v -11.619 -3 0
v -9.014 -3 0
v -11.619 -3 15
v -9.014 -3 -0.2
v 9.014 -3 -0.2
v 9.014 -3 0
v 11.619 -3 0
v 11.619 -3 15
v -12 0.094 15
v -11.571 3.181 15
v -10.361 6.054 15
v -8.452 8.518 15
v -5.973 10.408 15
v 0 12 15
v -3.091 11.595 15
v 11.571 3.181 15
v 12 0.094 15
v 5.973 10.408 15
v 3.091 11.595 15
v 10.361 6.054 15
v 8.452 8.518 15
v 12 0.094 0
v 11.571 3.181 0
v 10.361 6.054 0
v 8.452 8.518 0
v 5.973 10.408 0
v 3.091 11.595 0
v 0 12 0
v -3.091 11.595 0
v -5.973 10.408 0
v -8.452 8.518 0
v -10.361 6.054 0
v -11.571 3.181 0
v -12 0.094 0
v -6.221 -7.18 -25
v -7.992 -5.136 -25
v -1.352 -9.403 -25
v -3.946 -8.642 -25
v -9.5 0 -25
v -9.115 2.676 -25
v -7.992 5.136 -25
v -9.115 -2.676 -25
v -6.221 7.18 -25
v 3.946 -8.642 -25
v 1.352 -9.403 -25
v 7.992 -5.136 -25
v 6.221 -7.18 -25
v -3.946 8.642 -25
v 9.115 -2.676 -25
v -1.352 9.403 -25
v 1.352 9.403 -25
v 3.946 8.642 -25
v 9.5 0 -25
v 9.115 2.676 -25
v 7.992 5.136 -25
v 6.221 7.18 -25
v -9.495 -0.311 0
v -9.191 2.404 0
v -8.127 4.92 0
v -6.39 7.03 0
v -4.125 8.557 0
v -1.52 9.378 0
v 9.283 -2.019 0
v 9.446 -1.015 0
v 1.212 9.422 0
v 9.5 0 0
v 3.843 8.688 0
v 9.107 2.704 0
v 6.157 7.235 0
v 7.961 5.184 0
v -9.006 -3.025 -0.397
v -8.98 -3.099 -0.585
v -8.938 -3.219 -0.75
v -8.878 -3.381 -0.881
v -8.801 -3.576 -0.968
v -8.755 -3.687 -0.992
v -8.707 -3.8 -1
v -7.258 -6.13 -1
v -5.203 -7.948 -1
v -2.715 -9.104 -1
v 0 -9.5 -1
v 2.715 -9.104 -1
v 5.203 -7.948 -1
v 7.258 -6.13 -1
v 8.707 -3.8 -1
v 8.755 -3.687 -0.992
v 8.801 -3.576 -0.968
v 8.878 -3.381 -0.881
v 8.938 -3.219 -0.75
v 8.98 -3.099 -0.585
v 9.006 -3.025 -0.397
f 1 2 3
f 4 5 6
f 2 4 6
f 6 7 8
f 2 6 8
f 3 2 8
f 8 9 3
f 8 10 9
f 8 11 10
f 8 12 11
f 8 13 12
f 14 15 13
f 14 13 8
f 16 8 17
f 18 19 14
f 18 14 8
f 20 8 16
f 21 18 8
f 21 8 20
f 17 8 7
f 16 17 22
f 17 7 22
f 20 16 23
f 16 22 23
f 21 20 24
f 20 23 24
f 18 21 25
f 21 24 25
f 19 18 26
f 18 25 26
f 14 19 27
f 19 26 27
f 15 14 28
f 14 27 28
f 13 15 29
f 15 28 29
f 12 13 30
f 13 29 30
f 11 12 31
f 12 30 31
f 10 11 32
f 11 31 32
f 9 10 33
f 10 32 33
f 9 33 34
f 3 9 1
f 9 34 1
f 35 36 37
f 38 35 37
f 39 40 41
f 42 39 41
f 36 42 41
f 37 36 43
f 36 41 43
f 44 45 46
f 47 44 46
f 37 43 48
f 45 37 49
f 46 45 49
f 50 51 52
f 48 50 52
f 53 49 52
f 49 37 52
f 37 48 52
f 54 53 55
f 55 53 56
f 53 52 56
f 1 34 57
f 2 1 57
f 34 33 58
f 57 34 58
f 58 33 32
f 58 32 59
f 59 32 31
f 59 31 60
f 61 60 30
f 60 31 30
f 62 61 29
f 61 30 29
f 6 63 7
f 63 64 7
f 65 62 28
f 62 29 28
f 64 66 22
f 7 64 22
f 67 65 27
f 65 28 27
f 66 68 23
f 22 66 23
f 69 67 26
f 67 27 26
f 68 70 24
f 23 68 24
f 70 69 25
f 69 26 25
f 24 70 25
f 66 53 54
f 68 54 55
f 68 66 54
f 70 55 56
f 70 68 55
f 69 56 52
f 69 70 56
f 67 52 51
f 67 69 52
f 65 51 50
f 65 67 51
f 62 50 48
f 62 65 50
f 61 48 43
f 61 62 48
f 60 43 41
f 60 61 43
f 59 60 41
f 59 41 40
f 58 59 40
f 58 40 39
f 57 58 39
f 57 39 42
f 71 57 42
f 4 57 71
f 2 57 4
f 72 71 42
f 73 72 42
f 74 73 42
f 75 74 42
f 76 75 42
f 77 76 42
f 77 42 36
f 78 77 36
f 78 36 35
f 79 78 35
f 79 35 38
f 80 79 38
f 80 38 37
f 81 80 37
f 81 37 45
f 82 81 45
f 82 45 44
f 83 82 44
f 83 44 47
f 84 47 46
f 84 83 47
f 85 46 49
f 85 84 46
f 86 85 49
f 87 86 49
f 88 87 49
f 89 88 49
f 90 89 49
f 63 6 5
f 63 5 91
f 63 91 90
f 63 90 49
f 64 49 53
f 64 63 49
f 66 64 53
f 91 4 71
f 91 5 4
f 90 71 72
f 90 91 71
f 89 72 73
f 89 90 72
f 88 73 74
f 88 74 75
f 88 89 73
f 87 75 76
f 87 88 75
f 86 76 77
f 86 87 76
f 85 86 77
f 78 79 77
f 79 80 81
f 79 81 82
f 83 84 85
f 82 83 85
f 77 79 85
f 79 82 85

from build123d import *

# Parameters (mm, degrees)
F0_R     = 9.5
F1_DEPTH = 25
F2_R     = 12
F2_R_2   = 9.5
F3_DEPTH = 15
F7_DEPTH = 12.5
F8_R     = 0.8


with BuildPart() as f1:
    # F0 (on Top) → F1 (new body)
    with BuildSketch(Plane.XY):
        Circle(F0_R)
    extrude(amount=-F1_DEPTH)

    # F2 (on face) → F3 (join)
    with BuildSketch(Plane.XY):
        Circle(F2_R)
        Circle(F2_R_2, mode=Mode.SUBTRACT)
        Circle(F2_R_2)
    extrude(amount=F3_DEPTH)

    # F6 (on Right) → F7 (cut, symmetric)
    with BuildSketch(Plane.YZ):
        Polygon((-9.5, -1), (-3, -1), (-3, 15), (-12, 15), (-12, 0), (-9.5, 0), align=None)
    extrude(amount=F7_DEPTH, both=True, mode=Mode.SUBTRACT)

    # F8
    f8_edges = [f1.edges().sort_by_distance(p)[0] for p in [
        (0, -3, -1),
    ]]
    fillet(f8_edges, radius=F8_R)


solid = f1.part
